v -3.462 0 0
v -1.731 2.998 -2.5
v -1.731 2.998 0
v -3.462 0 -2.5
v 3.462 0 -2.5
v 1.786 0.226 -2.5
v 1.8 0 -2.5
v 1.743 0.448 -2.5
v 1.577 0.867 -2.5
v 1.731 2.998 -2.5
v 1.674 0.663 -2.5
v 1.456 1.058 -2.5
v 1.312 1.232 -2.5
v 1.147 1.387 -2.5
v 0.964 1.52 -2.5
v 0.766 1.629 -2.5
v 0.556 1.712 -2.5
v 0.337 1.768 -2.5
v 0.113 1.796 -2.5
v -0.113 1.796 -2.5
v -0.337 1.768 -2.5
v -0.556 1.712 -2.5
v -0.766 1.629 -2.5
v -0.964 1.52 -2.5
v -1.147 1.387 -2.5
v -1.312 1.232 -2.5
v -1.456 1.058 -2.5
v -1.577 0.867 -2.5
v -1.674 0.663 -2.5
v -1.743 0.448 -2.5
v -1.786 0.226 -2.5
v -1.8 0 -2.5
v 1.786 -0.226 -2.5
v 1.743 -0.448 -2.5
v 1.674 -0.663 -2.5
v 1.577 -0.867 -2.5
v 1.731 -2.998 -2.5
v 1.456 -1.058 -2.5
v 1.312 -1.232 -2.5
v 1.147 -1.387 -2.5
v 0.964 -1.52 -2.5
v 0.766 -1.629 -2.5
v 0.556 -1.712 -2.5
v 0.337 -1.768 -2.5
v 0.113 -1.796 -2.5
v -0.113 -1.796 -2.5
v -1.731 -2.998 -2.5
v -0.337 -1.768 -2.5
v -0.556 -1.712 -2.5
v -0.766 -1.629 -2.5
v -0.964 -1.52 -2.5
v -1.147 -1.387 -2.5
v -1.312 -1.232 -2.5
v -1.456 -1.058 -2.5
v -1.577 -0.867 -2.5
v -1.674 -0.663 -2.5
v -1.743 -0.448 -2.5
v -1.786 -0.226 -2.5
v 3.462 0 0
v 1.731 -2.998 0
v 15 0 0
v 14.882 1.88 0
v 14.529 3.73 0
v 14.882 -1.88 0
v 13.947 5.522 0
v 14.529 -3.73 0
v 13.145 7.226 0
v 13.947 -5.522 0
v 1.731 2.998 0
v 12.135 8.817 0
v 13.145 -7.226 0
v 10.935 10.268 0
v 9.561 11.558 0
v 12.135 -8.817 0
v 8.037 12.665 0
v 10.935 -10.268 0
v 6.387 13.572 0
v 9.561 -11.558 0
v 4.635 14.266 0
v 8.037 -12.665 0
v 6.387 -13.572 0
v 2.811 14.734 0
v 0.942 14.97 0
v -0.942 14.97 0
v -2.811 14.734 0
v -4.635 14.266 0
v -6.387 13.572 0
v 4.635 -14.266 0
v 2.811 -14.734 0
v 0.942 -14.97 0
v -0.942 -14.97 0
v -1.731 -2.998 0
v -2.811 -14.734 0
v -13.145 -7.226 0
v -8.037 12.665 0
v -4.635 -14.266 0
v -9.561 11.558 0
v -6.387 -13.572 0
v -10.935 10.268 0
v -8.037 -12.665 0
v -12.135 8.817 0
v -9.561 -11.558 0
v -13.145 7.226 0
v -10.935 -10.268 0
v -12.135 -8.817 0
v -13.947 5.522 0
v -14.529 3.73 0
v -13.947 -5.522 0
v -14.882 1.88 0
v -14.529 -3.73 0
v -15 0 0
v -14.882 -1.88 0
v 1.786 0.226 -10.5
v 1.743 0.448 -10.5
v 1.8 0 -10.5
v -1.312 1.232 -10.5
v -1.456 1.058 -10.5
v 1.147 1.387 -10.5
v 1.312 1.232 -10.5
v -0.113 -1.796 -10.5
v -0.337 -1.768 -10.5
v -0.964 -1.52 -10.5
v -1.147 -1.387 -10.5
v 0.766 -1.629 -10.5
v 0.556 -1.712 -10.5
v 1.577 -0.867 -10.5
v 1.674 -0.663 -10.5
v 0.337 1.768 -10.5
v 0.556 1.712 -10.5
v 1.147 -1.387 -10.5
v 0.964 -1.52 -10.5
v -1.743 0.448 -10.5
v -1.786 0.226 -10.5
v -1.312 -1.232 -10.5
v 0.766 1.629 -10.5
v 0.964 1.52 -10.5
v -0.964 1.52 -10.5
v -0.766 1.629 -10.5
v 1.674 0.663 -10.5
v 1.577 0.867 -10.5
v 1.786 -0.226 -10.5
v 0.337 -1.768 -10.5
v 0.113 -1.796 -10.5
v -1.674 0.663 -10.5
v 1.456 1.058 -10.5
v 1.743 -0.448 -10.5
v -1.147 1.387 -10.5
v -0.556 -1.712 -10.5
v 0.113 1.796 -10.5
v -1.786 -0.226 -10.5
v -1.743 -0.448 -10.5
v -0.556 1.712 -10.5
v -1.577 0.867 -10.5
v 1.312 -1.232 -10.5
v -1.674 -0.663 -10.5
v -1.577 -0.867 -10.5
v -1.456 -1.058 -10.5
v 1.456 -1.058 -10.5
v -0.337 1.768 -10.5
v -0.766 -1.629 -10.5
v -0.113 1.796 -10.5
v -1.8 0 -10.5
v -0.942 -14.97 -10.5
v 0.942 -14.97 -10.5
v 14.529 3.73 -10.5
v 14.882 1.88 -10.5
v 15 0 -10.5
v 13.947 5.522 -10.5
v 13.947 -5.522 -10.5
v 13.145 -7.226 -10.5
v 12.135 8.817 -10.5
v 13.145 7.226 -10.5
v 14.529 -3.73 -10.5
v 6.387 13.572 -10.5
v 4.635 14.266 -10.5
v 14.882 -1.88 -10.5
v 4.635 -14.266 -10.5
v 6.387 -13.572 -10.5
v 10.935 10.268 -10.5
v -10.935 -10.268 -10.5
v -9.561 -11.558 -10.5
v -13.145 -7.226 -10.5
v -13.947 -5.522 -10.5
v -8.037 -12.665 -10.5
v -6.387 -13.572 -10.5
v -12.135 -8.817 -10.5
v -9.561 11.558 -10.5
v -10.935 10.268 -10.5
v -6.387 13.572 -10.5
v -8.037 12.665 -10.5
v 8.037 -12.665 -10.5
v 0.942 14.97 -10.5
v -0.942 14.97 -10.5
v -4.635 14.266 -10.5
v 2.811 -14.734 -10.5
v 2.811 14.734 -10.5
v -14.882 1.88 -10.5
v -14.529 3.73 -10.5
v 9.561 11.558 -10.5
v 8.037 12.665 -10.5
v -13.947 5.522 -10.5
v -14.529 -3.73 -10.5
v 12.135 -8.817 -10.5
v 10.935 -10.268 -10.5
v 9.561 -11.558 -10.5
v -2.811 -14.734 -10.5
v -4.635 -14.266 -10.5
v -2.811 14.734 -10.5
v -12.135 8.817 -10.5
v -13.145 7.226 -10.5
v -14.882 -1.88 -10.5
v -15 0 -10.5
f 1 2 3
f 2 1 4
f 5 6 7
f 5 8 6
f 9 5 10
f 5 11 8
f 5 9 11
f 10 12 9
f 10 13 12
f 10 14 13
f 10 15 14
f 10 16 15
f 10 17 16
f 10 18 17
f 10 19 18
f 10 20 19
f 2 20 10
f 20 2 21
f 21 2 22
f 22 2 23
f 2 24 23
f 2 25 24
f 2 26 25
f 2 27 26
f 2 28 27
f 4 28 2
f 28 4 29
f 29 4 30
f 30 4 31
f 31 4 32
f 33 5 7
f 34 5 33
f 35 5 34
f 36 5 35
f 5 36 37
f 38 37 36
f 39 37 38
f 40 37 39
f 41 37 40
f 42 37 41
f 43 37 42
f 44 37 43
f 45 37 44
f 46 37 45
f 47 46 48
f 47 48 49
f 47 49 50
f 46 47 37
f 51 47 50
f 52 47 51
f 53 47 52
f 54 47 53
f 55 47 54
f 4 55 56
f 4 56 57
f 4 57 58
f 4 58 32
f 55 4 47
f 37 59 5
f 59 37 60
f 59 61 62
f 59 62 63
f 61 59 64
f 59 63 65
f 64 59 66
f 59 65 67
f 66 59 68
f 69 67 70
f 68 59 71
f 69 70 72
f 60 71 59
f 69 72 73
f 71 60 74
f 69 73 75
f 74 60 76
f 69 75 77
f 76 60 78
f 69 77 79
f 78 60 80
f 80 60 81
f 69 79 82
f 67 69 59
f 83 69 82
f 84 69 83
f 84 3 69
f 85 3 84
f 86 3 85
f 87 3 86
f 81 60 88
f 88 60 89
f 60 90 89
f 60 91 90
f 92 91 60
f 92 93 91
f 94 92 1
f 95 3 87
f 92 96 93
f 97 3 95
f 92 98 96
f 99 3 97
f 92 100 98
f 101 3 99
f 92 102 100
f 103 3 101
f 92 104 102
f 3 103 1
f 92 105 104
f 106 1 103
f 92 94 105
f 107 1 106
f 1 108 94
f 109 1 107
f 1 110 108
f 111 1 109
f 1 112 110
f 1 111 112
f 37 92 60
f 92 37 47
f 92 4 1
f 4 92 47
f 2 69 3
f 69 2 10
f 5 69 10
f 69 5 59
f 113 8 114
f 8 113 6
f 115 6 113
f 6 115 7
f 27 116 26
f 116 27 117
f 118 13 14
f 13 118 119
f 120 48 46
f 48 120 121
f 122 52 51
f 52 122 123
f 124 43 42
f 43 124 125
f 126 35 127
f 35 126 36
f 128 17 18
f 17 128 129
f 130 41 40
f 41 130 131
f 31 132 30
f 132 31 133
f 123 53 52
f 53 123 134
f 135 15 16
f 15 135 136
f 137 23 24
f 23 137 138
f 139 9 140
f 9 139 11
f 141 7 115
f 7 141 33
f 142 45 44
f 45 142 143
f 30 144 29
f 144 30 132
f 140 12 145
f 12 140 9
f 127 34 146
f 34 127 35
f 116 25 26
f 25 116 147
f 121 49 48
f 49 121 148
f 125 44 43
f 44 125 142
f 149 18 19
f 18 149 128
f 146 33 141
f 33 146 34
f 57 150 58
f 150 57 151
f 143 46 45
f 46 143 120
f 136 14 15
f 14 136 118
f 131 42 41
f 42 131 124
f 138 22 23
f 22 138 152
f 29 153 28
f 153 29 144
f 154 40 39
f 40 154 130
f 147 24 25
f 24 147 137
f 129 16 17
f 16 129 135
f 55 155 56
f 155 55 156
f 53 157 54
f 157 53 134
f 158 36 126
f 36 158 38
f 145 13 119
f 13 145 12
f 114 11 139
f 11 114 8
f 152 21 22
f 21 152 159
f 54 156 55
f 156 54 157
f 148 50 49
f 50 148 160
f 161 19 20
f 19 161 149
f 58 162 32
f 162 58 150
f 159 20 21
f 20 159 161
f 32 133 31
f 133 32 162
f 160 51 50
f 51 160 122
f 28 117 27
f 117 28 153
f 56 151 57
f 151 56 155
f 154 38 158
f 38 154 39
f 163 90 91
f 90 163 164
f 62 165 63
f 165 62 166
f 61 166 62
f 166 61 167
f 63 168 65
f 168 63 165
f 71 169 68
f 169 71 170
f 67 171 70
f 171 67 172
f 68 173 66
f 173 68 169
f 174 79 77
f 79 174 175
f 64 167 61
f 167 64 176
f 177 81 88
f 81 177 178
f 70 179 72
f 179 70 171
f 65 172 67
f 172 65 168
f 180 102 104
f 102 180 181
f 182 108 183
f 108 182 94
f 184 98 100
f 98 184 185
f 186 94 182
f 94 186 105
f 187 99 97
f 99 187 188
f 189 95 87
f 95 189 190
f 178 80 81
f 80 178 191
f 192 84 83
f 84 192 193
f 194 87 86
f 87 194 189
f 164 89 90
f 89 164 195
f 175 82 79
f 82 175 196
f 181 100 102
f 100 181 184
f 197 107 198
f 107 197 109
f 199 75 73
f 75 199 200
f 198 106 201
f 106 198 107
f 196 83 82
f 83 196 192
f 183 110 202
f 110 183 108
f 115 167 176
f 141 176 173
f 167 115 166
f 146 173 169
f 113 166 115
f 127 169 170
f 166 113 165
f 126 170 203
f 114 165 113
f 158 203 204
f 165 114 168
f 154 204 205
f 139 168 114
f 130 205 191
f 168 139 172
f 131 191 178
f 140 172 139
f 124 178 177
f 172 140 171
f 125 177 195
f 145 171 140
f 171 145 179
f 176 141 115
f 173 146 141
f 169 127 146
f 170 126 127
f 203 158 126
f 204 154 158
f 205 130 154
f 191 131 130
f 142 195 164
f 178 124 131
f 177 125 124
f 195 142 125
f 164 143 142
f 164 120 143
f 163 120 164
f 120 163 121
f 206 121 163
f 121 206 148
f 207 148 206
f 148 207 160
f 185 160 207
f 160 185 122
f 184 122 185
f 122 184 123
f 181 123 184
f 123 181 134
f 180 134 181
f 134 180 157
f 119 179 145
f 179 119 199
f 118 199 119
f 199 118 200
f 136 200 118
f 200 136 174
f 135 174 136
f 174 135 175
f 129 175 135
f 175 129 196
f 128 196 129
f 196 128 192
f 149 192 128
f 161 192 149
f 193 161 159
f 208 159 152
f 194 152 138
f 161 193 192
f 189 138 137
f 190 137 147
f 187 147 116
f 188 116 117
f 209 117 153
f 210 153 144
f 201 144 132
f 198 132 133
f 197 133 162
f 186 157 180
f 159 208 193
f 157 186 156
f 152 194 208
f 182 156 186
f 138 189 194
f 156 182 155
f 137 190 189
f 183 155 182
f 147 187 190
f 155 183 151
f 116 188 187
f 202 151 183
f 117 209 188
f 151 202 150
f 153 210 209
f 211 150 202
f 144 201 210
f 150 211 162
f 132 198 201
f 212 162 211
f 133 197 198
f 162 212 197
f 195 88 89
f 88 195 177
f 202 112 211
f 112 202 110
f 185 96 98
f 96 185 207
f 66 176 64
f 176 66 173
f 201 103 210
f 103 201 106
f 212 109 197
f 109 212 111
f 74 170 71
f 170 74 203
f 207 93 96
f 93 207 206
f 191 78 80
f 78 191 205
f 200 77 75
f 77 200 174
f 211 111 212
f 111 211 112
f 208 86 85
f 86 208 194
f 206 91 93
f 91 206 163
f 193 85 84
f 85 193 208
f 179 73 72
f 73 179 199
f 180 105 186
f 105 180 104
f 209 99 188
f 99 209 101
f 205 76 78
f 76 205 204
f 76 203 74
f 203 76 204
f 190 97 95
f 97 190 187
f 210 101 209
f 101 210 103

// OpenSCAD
$fn = 50;

difference() {
	union() {
		translate(v = [0, 0, -10.5]) {
			cylinder(h = 10.5, r = 15.0);
		}
	}
	union() {
		translate(v = [0, 0, 0]) {
			rotate(a = [0, 0, 0]) {
				difference() {
					union() {
						translate(v = [0, 0, -2.5]) {
							linear_extrude(height = 2.5) {
								polygon(points = [[3.4619999999999997, 0.0], [1.7310000000000003, 2.9981799479017264], [-1.7309999999999992, 2.9981799479017264], [-3.4619999999999997, 4.2397272186481365e-16], [-1.7310000000000014, -2.998179947901726], [1.7309999999999977, -2.9981799479017277]]);
							}
						}
					}
					union();
				}
			}
		}
		#translate(v = [0, 0, -100.0]) {
			cylinder(h = 200, r = 1.8);
		}
	}
}
